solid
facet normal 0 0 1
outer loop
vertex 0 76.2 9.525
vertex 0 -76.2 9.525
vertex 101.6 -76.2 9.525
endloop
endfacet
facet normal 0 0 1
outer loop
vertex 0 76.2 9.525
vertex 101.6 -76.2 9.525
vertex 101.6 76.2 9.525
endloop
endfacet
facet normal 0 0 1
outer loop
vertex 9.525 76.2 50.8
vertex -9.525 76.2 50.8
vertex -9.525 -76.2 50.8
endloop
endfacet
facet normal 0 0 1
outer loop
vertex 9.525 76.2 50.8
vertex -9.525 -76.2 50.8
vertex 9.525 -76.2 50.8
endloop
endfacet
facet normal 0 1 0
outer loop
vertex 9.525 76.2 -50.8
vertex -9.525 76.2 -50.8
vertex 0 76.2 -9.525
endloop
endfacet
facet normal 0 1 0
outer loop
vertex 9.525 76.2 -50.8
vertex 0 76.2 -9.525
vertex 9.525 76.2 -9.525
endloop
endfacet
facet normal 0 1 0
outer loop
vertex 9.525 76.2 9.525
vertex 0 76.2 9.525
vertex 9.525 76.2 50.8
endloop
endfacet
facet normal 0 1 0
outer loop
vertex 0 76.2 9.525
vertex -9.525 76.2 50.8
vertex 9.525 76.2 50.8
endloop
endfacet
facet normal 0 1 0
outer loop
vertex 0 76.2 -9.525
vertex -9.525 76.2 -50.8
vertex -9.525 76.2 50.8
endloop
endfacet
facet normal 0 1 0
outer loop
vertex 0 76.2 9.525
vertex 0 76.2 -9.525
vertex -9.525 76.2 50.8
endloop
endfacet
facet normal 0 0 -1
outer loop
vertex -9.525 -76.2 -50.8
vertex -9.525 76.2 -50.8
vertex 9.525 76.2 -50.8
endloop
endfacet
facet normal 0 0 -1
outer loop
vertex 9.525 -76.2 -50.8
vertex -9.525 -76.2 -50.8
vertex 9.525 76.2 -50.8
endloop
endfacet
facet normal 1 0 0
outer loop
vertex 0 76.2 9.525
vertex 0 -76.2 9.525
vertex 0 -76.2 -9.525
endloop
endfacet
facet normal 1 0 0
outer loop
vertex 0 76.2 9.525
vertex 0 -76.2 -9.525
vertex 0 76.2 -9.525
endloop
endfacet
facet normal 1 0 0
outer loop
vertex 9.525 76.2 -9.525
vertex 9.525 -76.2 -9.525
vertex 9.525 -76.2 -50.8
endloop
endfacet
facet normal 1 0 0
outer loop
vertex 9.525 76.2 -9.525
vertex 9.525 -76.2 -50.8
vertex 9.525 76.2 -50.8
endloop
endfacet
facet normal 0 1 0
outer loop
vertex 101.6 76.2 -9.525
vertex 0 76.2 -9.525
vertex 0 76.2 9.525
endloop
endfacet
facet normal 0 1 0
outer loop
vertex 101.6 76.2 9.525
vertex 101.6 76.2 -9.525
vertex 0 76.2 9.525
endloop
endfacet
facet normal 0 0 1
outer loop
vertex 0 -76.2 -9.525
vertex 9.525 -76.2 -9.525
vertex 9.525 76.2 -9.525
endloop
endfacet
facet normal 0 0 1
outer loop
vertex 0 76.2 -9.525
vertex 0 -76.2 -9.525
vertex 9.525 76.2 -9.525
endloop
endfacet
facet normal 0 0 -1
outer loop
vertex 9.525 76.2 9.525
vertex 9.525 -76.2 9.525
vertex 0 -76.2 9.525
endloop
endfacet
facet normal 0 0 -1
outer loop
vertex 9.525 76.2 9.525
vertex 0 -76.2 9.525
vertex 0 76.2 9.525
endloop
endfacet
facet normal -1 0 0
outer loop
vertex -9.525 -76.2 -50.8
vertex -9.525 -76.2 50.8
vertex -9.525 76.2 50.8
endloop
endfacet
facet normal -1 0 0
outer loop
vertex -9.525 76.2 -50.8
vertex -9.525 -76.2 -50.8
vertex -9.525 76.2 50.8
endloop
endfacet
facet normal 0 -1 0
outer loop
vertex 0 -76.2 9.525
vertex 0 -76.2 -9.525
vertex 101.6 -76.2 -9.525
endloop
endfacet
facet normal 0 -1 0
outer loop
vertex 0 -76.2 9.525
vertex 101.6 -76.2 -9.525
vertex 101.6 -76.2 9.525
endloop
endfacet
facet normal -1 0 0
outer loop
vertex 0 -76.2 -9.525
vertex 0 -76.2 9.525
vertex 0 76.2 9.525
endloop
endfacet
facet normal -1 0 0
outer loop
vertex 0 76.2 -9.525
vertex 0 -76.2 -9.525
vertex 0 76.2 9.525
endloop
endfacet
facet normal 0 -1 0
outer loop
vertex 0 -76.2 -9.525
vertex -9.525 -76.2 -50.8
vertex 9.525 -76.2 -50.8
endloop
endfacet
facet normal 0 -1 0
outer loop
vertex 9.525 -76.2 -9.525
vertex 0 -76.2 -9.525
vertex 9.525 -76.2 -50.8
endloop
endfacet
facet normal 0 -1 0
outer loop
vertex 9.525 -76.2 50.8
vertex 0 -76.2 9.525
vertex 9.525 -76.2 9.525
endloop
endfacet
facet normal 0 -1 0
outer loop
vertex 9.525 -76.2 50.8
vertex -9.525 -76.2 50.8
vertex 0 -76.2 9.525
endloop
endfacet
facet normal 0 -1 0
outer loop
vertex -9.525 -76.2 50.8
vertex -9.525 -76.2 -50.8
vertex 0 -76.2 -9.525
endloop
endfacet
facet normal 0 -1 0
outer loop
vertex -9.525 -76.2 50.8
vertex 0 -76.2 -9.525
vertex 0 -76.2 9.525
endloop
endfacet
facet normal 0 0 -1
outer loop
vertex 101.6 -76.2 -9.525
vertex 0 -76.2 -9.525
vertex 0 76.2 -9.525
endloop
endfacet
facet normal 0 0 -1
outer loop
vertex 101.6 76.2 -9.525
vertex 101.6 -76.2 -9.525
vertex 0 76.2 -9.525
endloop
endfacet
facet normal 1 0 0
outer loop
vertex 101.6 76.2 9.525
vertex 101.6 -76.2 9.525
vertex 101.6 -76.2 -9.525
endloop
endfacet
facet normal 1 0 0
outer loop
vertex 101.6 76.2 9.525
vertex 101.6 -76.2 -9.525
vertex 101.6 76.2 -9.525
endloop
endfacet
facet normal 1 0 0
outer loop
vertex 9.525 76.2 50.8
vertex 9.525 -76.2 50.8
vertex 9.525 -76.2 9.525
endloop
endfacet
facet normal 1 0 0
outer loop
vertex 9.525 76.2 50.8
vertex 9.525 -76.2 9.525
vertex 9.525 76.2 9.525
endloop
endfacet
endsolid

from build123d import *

# Parameters (mm, degrees)
F0_W      = 19.05
F0_H      = 152.4
F1_DEPTH  = 50.8
F2_W      = 152.4
F2_H      = 19.05
F3_DEPTH  = 9.525
F3_FACE_W = 152.4
F3_FACE_H = 19.05
F4_DEPTH  = 101.6


with BuildPart() as f1:
    # F0 (on Top) → F1 (new body, symmetric)
    with BuildSketch(Plane.XY):
        Rectangle(F0_W, F0_H)
    extrude(amount=F1_DEPTH, both=True)

    # F2 (on face) → F3 (cut)
    with BuildSketch(Plane.YZ.offset(9.525)):
        Rectangle(F2_W, F2_H)
    extrude(amount=-F3_DEPTH, mode=Mode.SUBTRACT)


with BuildPart() as f4:
    # F3_face (on face) → F4 (new body)
    with BuildSketch(Plane.YZ):
        Rectangle(F3_FACE_W, F3_FACE_H)
    extrude(amount=F4_DEPTH)


solid = Compound([f1.part, f4.part])
